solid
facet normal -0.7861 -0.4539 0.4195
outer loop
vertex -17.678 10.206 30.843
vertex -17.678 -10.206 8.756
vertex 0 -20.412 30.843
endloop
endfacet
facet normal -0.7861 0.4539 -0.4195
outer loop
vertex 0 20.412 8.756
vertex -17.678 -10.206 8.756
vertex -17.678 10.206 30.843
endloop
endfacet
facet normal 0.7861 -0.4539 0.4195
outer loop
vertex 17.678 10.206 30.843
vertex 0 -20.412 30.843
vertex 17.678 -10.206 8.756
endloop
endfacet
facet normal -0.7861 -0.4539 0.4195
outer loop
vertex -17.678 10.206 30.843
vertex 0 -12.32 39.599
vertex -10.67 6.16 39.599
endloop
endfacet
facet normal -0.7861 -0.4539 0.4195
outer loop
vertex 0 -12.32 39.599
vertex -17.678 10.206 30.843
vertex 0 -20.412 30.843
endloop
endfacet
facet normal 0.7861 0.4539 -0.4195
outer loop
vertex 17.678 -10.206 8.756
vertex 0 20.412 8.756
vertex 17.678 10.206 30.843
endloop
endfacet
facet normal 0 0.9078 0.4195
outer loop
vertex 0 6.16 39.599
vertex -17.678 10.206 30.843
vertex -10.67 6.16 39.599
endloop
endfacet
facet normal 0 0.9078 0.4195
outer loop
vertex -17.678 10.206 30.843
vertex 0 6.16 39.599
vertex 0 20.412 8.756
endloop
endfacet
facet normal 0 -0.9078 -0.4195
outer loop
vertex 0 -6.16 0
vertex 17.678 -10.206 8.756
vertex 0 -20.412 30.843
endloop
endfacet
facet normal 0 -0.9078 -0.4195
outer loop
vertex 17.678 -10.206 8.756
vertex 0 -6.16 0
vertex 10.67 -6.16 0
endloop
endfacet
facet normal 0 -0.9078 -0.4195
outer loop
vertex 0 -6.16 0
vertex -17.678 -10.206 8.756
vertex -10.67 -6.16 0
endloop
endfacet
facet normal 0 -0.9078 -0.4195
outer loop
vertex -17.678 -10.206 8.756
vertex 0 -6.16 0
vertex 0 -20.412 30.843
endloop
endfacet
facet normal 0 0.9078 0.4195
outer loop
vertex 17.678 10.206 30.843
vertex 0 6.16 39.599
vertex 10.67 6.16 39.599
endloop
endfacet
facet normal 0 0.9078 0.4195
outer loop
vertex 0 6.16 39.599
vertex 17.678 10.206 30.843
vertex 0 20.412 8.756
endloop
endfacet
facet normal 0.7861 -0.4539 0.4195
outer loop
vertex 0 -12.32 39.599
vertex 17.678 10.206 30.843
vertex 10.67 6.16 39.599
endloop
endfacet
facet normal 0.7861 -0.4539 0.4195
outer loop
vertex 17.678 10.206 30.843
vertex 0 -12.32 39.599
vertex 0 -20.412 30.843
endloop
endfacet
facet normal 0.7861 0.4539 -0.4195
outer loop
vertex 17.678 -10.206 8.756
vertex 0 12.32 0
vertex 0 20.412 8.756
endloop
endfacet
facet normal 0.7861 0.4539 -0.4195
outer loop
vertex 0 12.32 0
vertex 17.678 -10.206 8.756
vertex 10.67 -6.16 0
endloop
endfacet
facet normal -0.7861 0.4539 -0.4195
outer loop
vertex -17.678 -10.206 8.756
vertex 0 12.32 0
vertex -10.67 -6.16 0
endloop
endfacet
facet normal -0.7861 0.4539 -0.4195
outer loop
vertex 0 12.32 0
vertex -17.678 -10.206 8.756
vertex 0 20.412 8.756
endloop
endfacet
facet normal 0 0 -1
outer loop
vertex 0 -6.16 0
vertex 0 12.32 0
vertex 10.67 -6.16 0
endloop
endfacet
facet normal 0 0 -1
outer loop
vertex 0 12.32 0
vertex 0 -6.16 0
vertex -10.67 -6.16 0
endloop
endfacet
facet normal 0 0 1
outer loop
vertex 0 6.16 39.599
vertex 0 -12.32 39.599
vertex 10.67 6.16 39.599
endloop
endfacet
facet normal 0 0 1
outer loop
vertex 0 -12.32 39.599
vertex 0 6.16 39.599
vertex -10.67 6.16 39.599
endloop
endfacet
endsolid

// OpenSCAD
//////////////////////////////////////////////////////////////////////////////////////////
//  
//  'Dürer's Solid (72°)' by Chris Molloy (http://chrismolloy.com/durer)
//  
//  Released under Creative Commons - Attribution - Share Alike licence
//  
//  For more information see:
//  https://en.wikipedia.org/wiki/Melencolia_I
//  https://en.wikipedia.org/wiki/Truncated_triangular_trapezohedron#D.C3.BCrer.27s_solid
//  http://mathworld.wolfram.com/DuerersSolid.html
//  
//////////////////////////////////////////////////////////////////////////////////////////

// Length of edge of cube base (resulting polyhedron will be ≈1.6 times this high)
scale_base = 25; // mm

/* Hidden */
zz = 1 / sqrt(3); // ≈ 0.57735
theta = acos(zz); // ≈ 54.73561°

stretch_72 = sqrt(1 + (3 / sqrt(5))); // ≈ 1.53024
unit_height_72 = sqrt((23 / sqrt(5)) - 0.25) / 2; // ≈ 1.58398
drop_72 = ((sqrt(3) * stretch_72) - unit_height_72) / 2; // ≈ 0.53324

module unit_cube() {
  rotate([0, 0, -15]) {
    rotate(a = theta, v = [1, -1, 0]) {
      cube([scale_base, scale_base, scale_base]);
    }
  }
}

module durers_solid(drop, stretch, unit_height) {
  difference() {
    translate([0, 0, -drop * scale_base]) {
      scale([1, 1, stretch]) {
        unit_cube();
      }
    }
    translate([0, 0, -scale_base / 2]) {
      cube([scale_base, scale_base, scale_base], center = true);
    }
    translate([0, 0, (unit_height * scale_base) + (scale_base / 2)]) {
      cube([scale_base, scale_base, scale_base], center = true);
    }
  }
}

durers_solid(drop_72, stretch_72, unit_height_72);
